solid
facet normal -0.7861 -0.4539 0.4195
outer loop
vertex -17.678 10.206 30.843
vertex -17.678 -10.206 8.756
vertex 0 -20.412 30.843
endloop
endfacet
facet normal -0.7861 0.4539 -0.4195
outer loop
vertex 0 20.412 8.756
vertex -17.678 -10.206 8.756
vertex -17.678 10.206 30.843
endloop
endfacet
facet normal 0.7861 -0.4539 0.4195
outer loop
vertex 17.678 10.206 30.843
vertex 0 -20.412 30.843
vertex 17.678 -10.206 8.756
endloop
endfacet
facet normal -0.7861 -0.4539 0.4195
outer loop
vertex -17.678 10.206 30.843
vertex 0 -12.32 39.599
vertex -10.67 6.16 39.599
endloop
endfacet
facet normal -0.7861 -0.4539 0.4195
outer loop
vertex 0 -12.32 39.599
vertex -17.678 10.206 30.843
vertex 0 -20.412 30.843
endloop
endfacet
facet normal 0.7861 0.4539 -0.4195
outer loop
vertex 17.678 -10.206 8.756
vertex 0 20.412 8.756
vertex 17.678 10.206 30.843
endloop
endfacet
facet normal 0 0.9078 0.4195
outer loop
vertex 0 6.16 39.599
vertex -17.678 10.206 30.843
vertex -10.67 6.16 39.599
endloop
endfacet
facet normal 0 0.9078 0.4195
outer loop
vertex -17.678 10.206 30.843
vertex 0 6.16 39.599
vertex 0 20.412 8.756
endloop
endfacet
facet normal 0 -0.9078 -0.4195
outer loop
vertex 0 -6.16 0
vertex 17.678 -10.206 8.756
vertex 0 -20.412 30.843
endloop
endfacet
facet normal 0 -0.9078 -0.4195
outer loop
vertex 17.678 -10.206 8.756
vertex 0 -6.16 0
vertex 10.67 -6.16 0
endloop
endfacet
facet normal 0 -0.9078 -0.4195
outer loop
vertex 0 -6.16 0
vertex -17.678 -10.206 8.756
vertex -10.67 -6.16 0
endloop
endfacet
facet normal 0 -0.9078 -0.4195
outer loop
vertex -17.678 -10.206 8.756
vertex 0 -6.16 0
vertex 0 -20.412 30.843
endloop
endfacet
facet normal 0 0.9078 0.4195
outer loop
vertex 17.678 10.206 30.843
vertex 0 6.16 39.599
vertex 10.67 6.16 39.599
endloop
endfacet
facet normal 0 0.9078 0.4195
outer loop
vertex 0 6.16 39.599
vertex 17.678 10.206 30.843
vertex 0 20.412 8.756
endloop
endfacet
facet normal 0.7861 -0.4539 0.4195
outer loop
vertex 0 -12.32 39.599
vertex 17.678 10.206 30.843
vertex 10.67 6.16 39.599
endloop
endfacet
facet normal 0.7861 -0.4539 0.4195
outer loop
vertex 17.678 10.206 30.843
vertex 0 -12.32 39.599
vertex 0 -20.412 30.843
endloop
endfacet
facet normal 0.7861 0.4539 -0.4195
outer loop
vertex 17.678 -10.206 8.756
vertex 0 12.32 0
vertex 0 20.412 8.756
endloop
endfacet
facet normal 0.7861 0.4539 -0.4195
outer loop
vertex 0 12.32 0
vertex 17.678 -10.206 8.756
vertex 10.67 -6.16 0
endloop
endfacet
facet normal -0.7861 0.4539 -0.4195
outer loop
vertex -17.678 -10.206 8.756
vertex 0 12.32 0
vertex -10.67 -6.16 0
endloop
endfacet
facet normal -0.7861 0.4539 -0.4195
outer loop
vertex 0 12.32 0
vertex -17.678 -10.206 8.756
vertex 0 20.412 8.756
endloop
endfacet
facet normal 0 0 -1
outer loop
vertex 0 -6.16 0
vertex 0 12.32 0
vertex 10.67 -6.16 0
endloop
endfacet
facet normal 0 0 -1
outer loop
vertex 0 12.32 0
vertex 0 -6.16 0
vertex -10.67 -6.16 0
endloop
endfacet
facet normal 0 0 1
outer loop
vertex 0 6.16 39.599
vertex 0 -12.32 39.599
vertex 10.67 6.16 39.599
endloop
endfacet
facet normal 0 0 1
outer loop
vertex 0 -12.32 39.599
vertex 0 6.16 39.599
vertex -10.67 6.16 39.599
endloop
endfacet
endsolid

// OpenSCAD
//////////////////////////////////////////////////////////////////////////////////////////
//  
//  'Dürer's Solid (72°)' by Chris Molloy (http://chrismolloy.com/durer)
//  
//  Released under Creative Commons - Attribution - Share Alike licence
//  
//  For more information see:
//  https://en.wikipedia.org/wiki/Melencolia_I
//  https://en.wikipedia.org/wiki/Truncated_triangular_trapezohedron#D.C3.BCrer.27s_solid
//  http://mathworld.wolfram.com/DuerersSolid.html
//  
//////////////////////////////////////////////////////////////////////////////////////////

// Length of edge of cube base (resulting polyhedron will be ≈1.6 times this high)
scale_base = 25; // mm

/* Hidden */
zz = 1 / sqrt(3); // ≈ 0.57735
theta = acos(zz); // ≈ 54.73561°

stretch_72 = sqrt(1 + (3 / sqrt(5))); // ≈ 1.53024
unit_height_72 = sqrt((23 / sqrt(5)) - 0.25) / 2; // ≈ 1.58398
drop_72 = ((sqrt(3) * stretch_72) - unit_height_72) / 2; // ≈ 0.53324

module unit_cube() {
  rotate([0, 0, -15]) {
    rotate(a = theta, v = [1, -1, 0]) {
      cube([scale_base, scale_base, scale_base]);
    }
  }
}

module durers_solid(drop, stretch, unit_height) {
  difference() {
    translate([0, 0, -drop * scale_base]) {
      scale([1, 1, stretch]) {
        unit_cube();
      }
    }
    translate([0, 0, -scale_base / 2]) {
      cube([scale_base, scale_base, scale_base], center = true);
    }
    translate([0, 0, (unit_height * scale_base) + (scale_base / 2)]) {
      cube([scale_base, scale_base, scale_base], center = true);
    }
  }
}

durers_solid(drop_72, stretch_72, unit_height_72);
